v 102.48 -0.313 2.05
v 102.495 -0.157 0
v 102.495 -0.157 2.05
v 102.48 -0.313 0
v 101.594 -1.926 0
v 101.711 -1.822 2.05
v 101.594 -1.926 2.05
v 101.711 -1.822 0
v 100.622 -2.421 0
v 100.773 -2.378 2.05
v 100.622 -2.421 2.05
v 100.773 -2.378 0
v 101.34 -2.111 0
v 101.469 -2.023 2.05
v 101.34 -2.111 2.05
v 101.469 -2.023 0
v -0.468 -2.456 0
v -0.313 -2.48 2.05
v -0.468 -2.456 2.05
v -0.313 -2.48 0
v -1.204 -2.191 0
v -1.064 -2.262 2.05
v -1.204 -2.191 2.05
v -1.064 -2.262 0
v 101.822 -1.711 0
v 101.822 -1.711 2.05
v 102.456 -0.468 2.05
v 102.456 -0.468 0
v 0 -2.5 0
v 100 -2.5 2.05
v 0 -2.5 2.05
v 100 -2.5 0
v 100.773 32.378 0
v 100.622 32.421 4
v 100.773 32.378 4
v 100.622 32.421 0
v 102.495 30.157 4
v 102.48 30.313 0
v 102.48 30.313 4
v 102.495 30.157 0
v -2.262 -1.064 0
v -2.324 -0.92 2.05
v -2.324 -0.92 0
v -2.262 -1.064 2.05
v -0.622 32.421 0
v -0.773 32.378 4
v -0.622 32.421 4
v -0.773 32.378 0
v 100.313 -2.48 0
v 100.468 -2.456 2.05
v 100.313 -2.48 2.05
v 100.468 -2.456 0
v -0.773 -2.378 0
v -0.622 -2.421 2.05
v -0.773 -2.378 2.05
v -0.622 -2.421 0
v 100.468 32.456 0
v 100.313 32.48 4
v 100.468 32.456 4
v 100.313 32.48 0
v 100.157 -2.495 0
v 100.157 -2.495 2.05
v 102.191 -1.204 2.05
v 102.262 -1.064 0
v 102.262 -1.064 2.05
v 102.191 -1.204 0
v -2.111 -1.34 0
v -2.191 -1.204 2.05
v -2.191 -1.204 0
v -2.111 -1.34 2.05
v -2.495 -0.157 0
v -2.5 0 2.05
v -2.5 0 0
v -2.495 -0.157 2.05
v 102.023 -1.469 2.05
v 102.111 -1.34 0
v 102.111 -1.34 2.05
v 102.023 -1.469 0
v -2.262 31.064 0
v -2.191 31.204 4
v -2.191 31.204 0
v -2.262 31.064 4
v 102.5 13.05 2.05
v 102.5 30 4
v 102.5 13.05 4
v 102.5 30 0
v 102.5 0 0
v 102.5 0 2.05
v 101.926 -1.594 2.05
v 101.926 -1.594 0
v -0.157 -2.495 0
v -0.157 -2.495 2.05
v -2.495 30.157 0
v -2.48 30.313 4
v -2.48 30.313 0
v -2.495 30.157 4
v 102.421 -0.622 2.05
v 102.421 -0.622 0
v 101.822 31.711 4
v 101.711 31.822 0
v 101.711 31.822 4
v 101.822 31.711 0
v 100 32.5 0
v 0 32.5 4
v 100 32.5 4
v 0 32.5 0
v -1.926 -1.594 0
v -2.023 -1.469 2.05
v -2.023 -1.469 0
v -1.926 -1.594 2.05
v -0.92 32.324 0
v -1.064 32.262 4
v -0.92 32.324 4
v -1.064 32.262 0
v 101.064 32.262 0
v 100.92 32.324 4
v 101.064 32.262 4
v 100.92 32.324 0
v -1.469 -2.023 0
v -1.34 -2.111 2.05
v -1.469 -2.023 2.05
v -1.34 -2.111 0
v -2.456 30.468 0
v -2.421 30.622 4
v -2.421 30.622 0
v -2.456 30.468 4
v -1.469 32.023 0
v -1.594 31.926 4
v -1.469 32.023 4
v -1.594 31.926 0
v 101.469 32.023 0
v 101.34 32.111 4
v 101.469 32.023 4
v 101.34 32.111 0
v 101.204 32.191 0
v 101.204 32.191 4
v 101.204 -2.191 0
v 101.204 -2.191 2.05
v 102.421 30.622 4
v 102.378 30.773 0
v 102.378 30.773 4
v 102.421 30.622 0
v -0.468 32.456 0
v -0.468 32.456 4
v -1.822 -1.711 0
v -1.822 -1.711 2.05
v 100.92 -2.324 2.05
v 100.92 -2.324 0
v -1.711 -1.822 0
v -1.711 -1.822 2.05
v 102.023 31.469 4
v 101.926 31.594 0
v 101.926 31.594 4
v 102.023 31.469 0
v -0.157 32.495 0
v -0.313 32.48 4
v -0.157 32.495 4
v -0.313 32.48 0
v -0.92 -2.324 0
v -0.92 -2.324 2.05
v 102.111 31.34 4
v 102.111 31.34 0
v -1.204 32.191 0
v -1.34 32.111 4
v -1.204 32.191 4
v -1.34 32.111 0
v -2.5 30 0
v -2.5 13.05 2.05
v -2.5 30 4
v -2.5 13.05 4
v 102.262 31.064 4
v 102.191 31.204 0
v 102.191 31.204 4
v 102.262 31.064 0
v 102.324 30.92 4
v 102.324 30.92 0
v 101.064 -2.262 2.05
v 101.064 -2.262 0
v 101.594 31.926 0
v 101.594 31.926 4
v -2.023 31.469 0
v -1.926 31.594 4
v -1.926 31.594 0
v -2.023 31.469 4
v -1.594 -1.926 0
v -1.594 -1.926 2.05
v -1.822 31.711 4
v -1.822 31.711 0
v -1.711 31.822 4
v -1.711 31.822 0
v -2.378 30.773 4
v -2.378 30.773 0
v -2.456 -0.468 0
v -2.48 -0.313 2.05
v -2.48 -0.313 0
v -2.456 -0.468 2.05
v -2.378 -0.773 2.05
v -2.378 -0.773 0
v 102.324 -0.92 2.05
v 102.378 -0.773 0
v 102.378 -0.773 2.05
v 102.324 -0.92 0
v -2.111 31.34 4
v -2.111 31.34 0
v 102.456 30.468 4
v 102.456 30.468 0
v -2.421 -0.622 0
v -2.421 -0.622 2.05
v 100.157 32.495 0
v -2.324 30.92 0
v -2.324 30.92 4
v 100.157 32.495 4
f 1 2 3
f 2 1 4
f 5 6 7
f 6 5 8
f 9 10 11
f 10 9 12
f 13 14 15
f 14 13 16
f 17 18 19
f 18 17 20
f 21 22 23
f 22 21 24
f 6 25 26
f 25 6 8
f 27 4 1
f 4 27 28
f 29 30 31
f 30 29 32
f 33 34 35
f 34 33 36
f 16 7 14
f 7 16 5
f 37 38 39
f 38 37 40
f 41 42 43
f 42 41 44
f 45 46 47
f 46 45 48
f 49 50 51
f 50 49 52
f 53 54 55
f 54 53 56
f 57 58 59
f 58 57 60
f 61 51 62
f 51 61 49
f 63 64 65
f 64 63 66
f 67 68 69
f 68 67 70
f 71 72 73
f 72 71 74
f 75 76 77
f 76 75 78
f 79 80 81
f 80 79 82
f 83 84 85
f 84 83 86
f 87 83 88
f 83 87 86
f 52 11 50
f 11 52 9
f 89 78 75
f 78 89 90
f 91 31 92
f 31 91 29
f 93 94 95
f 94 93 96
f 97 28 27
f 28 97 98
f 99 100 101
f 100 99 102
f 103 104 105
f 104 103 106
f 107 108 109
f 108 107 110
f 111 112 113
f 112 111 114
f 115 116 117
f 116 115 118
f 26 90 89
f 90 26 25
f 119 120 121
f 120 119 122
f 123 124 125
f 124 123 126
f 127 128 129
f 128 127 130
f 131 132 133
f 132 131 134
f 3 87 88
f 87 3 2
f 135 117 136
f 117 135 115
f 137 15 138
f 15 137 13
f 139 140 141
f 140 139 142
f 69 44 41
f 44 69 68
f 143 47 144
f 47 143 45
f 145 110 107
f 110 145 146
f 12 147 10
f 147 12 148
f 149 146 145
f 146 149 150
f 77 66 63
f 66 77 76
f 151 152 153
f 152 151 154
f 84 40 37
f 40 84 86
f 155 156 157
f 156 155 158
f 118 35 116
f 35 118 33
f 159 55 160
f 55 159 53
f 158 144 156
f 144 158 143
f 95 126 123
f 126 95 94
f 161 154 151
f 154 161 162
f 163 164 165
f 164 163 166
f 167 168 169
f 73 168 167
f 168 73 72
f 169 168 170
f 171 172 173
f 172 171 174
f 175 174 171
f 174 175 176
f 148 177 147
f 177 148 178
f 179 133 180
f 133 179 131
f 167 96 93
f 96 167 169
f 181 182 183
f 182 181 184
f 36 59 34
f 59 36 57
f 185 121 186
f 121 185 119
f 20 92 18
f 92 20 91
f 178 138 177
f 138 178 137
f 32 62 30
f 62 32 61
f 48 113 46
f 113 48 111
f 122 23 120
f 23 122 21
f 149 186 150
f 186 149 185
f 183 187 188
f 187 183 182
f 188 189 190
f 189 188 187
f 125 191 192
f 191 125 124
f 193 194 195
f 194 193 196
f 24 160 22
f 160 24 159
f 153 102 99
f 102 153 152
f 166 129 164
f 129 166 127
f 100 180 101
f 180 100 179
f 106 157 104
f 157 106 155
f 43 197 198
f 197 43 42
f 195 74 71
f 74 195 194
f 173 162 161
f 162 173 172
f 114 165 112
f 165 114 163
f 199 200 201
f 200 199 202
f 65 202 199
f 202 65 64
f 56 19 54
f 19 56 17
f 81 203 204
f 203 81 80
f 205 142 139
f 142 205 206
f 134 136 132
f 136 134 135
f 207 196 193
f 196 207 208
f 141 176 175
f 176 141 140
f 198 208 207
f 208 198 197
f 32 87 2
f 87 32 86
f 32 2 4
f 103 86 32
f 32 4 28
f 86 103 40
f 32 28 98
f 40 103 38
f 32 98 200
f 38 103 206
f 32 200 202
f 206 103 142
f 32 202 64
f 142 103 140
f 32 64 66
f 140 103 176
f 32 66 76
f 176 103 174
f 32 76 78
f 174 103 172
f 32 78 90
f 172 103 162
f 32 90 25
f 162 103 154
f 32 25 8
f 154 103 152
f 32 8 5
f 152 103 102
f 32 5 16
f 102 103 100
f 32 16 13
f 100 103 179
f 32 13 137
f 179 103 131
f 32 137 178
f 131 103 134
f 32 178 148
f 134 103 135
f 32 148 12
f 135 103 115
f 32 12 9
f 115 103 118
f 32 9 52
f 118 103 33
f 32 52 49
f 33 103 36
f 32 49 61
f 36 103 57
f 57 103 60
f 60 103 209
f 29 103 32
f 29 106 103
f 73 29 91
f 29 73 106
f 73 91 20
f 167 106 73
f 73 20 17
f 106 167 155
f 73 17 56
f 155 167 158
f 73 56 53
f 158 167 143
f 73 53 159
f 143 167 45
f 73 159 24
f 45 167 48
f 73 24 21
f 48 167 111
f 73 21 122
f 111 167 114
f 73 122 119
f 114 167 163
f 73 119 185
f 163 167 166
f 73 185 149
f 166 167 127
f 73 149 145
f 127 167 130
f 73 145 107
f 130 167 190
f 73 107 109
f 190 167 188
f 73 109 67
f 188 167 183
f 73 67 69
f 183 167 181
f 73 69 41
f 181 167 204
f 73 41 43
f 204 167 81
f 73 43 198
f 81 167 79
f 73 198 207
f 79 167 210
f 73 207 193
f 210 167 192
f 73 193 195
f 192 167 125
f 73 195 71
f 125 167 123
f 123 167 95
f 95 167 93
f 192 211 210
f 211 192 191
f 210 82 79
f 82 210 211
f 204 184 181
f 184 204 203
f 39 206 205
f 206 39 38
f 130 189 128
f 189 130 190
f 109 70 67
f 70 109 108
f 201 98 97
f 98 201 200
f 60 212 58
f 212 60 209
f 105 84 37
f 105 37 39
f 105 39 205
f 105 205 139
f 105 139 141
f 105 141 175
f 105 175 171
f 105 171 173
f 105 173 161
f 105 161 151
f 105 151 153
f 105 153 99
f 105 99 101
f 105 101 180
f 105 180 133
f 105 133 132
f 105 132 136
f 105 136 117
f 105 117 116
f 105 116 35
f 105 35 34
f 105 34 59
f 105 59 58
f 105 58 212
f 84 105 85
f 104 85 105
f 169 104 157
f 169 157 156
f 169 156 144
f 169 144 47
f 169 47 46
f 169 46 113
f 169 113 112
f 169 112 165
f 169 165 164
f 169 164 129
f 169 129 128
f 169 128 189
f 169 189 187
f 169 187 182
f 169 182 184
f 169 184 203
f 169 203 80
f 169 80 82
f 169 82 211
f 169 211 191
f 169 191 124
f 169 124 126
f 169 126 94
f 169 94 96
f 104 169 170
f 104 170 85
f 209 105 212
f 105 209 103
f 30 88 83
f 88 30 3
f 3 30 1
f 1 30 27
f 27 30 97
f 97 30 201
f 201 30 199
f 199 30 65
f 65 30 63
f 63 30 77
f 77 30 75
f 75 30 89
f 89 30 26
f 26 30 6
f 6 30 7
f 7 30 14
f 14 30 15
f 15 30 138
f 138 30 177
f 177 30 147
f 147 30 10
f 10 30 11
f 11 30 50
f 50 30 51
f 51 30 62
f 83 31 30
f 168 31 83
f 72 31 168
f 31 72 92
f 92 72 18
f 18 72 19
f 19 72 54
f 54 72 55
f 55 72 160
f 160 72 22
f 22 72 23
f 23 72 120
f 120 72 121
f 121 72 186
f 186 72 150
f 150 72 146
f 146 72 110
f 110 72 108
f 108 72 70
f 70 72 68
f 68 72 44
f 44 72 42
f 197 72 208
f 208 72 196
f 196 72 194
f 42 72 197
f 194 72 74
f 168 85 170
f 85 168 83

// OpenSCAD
$fn=100;

module barrier(d=5,base_h=4,cut_h=2,l=100,cut_a=18,base_a=30)
{
    difference()
    {
        hull()
        {
            cylinder(d=d,h=base_h);
            translate([l,0,0]) cylinder(d=d,h=base_h);
            translate([l,base_a,0]) cylinder(d=d,h=base_h);
            translate([0,base_a,0]) cylinder(d=d,h=base_h);           
        }
        translate([-d-0.05,-d-0.05,base_h-cut_h+0.05])
            cube([2*d+l+0.1,cut_a+0.1,cut_h]);
    }
}

barrier();
